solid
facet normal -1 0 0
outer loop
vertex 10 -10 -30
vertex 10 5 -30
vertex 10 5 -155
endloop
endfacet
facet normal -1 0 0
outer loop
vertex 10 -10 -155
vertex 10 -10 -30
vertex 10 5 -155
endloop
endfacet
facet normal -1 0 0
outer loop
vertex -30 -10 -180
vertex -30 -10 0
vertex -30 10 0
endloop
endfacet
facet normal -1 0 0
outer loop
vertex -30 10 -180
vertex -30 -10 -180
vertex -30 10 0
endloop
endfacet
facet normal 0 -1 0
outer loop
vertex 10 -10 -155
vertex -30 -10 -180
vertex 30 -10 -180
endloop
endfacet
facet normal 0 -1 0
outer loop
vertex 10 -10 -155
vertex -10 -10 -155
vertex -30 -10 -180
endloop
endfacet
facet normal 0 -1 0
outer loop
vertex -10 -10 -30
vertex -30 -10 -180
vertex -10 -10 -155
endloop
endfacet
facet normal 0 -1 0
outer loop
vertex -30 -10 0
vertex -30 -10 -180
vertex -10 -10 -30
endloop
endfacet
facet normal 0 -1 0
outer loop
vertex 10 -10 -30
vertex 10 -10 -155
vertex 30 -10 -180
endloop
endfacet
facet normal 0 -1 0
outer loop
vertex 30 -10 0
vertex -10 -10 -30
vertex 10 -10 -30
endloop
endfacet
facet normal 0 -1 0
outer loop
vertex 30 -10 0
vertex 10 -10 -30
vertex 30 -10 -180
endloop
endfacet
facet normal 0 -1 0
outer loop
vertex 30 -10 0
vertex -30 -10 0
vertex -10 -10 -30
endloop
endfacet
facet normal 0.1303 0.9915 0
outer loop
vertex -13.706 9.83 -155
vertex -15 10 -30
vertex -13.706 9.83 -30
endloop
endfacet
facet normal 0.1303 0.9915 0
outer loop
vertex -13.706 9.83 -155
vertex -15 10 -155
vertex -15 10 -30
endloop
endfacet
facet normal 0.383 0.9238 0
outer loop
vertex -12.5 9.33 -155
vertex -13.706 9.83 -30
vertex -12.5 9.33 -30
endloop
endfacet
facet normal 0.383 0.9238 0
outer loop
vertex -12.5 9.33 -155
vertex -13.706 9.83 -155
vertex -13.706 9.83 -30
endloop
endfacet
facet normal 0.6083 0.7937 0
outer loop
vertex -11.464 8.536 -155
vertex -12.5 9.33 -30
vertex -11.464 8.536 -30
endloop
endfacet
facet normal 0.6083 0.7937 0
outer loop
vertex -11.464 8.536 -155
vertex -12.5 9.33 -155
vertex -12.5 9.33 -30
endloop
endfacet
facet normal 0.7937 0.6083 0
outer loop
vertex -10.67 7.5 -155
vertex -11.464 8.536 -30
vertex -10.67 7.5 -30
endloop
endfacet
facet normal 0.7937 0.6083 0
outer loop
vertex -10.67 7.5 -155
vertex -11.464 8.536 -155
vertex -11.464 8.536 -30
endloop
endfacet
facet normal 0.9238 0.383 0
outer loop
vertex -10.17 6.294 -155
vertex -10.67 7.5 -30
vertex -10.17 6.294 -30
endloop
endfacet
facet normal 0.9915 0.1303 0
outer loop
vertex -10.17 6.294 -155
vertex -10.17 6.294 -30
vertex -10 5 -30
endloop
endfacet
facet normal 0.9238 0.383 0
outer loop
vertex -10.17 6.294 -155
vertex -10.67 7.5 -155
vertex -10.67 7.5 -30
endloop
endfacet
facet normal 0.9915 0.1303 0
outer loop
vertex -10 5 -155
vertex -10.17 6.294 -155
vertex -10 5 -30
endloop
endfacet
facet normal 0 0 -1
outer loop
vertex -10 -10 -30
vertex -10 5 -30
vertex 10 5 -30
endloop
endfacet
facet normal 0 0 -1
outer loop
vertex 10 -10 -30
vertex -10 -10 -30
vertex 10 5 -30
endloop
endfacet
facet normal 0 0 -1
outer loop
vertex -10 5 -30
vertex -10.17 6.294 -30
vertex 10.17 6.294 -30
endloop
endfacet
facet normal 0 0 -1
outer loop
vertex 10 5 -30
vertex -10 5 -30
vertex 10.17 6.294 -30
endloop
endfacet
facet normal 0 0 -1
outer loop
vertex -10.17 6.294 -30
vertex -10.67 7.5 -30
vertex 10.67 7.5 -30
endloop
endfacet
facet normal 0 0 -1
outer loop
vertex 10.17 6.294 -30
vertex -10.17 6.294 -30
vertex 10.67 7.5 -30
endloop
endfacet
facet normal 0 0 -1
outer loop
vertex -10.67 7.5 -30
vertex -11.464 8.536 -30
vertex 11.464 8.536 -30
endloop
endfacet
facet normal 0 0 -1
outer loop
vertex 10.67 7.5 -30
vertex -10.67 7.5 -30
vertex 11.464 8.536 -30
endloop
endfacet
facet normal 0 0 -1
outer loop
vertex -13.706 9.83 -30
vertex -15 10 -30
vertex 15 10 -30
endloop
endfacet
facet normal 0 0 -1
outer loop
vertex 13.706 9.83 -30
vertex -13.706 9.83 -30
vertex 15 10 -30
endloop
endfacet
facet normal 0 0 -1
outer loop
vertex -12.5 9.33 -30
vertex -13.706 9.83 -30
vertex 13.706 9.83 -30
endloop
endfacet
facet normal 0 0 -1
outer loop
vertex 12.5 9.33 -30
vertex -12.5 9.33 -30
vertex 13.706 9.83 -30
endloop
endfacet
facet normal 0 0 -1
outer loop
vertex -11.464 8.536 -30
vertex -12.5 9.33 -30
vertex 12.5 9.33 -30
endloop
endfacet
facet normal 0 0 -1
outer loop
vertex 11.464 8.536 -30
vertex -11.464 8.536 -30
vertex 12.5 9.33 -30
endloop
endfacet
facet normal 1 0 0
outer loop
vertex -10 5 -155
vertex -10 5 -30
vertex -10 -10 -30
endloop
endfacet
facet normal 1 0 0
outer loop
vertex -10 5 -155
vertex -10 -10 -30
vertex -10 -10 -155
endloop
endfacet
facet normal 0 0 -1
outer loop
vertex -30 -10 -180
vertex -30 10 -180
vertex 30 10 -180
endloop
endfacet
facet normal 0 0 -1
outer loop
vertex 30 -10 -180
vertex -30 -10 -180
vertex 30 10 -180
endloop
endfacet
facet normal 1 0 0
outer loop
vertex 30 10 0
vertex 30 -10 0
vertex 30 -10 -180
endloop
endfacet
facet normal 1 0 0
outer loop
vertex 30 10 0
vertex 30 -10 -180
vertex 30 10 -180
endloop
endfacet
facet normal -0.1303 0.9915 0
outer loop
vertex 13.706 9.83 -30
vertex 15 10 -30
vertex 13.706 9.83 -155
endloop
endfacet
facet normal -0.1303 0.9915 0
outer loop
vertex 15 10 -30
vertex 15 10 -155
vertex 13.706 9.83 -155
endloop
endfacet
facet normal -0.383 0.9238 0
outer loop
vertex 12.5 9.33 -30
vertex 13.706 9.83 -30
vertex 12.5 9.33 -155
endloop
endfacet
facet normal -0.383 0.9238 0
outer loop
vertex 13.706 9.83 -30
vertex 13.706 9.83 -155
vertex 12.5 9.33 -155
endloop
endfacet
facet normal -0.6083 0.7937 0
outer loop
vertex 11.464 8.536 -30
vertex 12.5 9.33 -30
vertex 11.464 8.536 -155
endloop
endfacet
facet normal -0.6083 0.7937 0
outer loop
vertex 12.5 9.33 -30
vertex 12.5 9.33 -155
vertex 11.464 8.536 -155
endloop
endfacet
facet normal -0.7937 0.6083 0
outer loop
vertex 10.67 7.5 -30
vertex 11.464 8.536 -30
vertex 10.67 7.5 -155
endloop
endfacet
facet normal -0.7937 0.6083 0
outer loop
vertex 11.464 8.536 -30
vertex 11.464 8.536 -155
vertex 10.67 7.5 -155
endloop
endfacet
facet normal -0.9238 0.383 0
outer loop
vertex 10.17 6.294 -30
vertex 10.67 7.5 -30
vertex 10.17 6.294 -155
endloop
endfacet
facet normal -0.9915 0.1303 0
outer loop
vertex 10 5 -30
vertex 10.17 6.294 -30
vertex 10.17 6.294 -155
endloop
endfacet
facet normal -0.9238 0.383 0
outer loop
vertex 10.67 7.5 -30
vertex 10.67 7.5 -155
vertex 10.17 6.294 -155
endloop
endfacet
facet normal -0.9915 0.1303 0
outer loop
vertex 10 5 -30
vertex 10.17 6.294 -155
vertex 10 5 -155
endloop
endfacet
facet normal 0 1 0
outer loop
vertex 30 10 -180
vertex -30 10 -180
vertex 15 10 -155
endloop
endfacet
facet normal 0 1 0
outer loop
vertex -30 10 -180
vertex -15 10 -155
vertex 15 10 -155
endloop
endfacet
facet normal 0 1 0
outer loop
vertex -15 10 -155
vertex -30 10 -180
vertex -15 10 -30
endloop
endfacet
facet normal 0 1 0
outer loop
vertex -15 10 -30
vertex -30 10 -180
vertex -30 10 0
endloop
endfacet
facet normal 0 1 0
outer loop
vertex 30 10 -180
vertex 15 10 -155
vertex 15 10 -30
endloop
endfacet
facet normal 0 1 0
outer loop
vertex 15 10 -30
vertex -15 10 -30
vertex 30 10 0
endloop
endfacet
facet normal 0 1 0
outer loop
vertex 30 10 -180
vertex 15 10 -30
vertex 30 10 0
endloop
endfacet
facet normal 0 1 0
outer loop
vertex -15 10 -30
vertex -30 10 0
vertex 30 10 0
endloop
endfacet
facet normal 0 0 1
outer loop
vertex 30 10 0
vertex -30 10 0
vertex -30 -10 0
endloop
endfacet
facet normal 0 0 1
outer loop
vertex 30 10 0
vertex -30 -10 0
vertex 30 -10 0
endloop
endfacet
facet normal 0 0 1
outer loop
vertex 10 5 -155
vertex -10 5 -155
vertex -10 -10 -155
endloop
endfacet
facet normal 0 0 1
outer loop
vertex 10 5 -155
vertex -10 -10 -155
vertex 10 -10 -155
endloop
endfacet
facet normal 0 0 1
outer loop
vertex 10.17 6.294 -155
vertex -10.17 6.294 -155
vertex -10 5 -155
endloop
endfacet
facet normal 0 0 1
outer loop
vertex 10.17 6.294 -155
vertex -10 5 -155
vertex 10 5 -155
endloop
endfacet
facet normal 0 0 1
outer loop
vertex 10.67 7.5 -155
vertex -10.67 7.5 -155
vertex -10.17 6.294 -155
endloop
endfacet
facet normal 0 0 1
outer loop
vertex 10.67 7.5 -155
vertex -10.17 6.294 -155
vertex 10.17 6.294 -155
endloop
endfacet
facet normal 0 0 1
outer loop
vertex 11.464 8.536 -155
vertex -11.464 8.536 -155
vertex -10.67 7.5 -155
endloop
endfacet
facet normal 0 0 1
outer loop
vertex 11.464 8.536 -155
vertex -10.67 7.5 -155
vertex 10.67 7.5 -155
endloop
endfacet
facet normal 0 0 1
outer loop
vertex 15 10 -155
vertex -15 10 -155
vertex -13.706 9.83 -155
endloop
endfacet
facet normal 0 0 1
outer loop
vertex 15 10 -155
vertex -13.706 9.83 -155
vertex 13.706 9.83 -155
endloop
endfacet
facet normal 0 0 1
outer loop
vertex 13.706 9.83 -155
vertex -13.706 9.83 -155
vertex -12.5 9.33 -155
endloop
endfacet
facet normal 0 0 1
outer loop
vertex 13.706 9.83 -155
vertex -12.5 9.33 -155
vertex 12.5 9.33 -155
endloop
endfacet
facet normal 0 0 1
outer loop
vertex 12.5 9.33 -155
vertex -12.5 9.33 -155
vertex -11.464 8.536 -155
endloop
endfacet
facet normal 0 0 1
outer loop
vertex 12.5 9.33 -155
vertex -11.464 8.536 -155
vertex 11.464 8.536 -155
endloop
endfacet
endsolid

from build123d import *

# Parameters (mm, degrees)
SKETCH_2_W          = 60
SKETCH_2_H          = 20
EXTRUDE_1_DEPTH     = 180
SKETCH_14_W         = 20
SKETCH_14_H         = 125
CUT_EXTRUDE_1_DEPTH = 184.575597507
FILLET_1_R          = 5


with BuildPart() as part:
    # 草圖2 → 填料-伸長1 (new body)
    with BuildSketch(Plane.XY):
        Rectangle(SKETCH_2_W, SKETCH_2_H)
    extrude(amount=-EXTRUDE_1_DEPTH)

    # 草圖14 → 除料-伸長1 (cut, through all)
    with BuildSketch(Plane(origin=(0, 10, 0), x_dir=(1, 0, 0), z_dir=(0, 1, 0))):
        with Locations((0, 92.5)):
            Rectangle(SKETCH_14_W, SKETCH_14_H)
    extrude(amount=-CUT_EXTRUDE_1_DEPTH, mode=Mode.SUBTRACT)

    # 圓角1
    fillet_1_edges = [part.edges().sort_by_distance(p)[0] for p in [
        (10, 10, -92.5),
        (-10, 10, -92.5),
    ]]
    fillet(fillet_1_edges, radius=FILLET_1_R)


solid = part.part
